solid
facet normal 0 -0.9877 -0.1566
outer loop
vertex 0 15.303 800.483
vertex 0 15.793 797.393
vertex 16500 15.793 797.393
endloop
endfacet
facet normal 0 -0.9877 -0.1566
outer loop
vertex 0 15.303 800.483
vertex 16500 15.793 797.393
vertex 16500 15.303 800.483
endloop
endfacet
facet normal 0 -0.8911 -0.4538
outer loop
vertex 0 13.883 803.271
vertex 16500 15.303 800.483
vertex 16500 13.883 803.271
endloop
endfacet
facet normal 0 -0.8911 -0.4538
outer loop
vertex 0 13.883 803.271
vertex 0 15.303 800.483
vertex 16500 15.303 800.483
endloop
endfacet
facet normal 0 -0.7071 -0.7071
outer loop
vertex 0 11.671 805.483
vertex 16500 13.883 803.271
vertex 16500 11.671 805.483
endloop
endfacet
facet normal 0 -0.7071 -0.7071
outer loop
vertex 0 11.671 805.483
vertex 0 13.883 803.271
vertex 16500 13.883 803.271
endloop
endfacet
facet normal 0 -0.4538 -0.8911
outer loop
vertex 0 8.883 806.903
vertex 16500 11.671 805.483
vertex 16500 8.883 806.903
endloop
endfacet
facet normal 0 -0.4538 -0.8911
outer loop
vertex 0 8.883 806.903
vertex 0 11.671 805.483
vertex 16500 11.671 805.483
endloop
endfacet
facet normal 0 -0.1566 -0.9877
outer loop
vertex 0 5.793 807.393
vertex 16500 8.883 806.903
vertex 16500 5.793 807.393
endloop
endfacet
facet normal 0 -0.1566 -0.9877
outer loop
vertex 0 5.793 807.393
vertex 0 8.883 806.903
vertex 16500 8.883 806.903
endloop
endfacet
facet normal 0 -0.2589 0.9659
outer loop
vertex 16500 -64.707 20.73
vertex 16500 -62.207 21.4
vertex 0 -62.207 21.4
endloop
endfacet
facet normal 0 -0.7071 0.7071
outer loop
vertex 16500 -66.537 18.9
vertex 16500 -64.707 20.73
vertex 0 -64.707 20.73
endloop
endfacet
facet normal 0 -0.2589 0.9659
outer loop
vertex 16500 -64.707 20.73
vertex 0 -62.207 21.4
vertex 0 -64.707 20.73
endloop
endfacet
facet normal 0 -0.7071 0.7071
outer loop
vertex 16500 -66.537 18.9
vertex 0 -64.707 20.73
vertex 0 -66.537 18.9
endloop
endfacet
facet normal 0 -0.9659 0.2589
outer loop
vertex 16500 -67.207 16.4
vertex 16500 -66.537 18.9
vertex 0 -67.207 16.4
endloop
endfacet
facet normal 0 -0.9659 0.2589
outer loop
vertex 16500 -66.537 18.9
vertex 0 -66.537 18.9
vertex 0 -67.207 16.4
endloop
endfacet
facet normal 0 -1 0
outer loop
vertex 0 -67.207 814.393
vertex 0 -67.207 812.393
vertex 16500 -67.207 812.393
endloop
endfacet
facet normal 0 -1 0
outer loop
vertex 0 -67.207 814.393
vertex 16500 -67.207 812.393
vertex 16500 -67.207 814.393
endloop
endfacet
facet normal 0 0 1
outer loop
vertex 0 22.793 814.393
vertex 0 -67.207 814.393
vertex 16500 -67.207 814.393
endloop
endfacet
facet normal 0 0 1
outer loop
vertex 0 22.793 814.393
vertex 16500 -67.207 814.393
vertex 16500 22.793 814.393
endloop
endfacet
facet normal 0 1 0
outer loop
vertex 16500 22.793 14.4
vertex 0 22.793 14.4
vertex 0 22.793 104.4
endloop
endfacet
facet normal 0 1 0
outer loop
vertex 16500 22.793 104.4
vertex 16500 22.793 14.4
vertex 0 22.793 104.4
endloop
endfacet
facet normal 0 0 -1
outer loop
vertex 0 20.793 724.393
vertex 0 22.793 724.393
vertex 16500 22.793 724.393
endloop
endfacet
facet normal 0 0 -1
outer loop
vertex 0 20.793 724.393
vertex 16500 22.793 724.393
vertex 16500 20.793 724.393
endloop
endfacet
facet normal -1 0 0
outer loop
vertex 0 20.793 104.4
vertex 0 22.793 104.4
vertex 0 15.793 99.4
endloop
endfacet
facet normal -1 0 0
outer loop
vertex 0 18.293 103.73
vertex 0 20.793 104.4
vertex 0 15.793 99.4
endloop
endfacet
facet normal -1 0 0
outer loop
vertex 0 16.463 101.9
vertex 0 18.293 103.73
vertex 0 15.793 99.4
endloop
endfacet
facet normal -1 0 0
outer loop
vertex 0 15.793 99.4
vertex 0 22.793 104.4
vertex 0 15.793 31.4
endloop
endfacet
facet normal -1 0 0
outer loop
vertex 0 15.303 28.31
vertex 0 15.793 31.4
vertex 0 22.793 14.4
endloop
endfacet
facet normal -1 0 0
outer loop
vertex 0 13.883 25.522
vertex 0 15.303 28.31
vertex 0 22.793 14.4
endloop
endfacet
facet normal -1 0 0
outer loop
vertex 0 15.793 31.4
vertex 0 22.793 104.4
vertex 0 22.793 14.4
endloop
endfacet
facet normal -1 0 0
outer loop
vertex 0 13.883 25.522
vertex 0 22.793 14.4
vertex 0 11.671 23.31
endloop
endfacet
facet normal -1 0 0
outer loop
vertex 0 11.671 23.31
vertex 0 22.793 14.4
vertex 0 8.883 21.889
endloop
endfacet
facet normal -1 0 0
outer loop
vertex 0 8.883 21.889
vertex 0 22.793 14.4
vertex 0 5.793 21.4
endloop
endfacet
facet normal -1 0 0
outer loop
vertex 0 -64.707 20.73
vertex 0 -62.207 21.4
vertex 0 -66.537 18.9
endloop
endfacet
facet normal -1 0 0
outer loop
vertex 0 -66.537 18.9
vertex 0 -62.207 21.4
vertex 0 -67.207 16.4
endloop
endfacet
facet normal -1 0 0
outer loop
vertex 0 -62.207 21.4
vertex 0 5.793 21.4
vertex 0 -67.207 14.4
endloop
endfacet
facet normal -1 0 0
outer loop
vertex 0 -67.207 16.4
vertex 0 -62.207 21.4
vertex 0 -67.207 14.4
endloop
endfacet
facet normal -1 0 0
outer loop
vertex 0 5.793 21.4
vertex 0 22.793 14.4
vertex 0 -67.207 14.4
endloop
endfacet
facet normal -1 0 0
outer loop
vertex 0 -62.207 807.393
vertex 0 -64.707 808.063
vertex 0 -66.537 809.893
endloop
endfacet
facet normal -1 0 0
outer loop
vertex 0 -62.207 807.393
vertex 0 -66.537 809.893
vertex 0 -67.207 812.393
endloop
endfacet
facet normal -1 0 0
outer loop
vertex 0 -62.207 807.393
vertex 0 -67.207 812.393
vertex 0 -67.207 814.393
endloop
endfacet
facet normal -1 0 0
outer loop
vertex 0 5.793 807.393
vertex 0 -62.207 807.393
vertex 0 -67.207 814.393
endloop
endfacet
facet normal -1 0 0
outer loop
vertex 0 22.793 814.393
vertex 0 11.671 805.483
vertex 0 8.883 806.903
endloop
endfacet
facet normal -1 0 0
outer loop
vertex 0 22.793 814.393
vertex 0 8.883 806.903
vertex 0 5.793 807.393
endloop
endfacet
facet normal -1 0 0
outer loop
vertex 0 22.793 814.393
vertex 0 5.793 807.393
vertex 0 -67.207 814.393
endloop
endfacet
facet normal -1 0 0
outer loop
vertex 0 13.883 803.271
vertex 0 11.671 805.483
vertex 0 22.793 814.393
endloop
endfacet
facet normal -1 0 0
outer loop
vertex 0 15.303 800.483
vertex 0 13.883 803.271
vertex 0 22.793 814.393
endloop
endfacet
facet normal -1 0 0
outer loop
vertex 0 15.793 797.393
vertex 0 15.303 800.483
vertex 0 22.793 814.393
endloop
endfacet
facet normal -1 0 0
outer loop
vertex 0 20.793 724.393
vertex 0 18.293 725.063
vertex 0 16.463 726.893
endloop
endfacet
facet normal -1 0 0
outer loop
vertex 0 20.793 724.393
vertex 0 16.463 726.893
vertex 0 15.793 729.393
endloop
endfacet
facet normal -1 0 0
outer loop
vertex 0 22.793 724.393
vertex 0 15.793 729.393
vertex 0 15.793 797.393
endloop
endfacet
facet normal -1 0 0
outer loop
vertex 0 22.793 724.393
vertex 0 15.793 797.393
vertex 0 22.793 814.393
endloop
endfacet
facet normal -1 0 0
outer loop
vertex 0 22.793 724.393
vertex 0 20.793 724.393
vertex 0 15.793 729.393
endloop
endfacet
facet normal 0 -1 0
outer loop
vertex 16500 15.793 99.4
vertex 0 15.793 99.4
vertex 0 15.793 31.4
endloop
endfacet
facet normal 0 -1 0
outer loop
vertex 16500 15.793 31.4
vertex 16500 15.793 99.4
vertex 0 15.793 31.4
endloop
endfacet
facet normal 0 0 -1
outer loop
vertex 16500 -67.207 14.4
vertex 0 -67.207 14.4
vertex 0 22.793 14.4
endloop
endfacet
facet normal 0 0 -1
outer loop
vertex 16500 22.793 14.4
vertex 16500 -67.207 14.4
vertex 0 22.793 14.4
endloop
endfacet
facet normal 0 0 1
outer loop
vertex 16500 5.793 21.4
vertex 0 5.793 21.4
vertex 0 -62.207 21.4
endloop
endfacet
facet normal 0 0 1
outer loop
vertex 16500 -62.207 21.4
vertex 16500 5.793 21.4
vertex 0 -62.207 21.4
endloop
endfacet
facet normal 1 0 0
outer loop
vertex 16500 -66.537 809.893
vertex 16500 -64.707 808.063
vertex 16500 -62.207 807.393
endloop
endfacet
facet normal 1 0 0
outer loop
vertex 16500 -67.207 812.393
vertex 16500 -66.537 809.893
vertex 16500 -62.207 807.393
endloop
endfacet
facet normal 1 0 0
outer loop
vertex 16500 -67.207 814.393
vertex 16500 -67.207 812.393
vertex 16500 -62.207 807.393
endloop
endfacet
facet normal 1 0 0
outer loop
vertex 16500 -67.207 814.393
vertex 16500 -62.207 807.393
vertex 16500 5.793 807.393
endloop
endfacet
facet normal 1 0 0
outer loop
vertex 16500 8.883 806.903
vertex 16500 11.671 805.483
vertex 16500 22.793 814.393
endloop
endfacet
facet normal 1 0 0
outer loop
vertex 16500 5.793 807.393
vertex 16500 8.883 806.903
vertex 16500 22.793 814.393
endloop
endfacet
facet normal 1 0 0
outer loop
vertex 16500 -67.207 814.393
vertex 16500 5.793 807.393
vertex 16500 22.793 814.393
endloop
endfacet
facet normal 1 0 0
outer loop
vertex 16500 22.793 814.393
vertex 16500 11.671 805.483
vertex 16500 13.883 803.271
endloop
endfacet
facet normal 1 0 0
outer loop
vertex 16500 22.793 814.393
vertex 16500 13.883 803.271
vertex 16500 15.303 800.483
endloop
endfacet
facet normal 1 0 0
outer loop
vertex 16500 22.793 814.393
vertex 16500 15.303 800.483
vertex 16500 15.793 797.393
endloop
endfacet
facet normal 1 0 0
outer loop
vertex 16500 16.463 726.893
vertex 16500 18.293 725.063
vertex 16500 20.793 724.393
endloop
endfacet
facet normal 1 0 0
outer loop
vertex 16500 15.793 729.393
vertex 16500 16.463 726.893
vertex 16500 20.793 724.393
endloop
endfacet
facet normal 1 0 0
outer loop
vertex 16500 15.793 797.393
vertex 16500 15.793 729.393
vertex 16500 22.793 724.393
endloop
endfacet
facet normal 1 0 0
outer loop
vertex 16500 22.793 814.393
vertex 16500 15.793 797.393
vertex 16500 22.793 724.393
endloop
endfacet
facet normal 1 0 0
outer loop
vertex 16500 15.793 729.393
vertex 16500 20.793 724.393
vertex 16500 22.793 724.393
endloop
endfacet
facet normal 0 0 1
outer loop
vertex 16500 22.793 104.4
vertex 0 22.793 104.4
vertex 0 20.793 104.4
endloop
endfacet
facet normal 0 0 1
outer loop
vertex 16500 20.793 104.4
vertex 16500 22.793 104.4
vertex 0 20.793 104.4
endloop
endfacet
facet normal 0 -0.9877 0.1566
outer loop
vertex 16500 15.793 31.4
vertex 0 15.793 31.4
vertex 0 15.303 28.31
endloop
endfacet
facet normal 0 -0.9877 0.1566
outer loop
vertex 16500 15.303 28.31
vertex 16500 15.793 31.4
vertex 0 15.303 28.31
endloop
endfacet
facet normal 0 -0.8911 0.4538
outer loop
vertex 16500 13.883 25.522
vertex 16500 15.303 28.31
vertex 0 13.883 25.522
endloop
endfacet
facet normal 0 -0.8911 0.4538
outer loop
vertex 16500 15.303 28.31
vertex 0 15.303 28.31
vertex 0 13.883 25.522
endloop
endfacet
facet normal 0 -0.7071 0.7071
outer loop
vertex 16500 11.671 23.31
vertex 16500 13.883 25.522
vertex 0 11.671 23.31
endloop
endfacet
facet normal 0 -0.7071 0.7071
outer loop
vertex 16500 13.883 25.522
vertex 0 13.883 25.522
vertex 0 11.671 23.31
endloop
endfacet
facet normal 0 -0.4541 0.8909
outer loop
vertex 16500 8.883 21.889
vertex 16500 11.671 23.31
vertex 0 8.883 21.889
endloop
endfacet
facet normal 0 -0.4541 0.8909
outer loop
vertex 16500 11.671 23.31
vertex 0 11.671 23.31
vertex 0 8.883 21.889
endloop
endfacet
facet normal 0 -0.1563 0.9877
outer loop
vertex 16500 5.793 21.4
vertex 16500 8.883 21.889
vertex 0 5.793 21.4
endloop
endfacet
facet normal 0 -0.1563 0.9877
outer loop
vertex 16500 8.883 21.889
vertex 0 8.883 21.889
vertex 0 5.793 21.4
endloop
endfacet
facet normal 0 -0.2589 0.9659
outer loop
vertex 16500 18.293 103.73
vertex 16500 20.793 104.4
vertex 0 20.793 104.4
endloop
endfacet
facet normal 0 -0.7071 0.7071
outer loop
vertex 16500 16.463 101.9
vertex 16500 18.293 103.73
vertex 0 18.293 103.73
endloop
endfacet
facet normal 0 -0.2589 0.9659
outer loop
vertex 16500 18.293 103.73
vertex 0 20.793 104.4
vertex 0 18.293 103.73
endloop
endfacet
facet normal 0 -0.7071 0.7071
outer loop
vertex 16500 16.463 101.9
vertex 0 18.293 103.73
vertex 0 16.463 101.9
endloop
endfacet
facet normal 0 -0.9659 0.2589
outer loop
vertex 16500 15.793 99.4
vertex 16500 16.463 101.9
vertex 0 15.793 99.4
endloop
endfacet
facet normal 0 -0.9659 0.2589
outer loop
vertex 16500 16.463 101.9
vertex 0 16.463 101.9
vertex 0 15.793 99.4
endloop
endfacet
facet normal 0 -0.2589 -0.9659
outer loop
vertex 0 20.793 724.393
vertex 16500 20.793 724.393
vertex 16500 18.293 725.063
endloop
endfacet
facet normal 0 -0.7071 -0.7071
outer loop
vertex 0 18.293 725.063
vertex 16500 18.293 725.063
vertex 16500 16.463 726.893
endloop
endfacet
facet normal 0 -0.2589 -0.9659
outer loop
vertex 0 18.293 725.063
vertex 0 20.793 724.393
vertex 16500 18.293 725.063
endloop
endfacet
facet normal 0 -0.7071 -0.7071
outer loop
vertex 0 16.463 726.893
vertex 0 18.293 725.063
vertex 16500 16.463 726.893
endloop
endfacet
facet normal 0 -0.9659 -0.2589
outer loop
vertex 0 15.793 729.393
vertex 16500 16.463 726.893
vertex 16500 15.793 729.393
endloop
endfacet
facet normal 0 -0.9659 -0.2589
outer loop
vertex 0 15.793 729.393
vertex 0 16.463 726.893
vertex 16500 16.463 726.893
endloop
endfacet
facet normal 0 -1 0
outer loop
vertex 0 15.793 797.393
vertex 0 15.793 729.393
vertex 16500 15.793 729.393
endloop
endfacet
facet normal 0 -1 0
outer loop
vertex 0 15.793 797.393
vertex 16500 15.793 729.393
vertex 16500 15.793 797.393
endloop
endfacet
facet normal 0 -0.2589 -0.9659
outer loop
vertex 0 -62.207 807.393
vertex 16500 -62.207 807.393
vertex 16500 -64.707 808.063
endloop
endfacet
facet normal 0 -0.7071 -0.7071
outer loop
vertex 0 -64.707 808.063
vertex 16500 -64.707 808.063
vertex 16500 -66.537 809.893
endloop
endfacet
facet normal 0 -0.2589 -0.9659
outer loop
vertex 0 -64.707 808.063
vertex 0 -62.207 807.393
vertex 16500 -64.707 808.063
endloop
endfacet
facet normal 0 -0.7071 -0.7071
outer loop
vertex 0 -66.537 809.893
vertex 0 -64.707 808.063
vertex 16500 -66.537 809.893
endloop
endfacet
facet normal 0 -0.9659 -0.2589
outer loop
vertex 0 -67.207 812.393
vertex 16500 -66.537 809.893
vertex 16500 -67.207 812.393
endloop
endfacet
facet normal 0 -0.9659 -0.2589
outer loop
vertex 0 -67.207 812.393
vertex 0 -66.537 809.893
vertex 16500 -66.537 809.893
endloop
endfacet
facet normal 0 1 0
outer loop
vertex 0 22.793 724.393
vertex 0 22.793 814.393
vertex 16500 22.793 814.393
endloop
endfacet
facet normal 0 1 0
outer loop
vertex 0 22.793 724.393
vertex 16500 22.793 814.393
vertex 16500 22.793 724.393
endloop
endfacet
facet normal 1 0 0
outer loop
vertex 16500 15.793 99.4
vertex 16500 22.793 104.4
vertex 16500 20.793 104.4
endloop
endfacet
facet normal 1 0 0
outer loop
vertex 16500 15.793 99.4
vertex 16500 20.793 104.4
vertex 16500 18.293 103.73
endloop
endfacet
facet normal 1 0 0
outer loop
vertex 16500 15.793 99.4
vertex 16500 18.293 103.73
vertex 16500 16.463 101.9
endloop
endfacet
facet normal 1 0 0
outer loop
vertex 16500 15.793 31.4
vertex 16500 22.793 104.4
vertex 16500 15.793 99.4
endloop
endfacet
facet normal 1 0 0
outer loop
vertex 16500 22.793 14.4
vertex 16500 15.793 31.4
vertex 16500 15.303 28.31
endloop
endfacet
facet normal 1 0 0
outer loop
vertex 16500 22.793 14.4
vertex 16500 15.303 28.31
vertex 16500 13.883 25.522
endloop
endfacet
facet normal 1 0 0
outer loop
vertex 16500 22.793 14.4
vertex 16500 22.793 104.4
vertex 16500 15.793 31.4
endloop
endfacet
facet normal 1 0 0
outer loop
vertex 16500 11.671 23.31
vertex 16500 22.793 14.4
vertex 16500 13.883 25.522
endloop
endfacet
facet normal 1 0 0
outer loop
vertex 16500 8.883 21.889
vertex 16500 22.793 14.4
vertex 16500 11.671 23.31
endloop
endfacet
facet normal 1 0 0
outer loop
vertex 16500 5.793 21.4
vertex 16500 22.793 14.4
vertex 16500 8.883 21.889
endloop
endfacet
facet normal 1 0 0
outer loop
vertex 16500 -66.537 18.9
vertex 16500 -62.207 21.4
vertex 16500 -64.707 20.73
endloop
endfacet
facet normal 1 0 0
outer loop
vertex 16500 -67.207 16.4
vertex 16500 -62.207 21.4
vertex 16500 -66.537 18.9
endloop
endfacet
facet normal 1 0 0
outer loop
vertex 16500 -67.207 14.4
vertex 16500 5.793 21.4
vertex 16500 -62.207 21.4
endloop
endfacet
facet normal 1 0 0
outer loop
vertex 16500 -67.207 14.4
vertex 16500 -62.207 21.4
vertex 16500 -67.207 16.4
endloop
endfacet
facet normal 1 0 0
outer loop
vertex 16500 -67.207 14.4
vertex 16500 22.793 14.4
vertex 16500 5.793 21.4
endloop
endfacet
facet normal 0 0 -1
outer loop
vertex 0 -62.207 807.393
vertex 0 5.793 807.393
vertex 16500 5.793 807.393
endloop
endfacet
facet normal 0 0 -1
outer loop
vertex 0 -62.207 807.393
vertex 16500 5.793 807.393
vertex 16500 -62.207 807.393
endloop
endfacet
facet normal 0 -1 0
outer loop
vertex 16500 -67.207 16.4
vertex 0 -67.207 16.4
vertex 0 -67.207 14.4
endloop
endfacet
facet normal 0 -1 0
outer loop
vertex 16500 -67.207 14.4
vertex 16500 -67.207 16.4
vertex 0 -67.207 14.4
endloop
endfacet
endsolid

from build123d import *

# Parameters (mm, degrees)
EXTRUDE017_DEPTH = 16500
EXTRUDE018_DEPTH = 16500


with BuildPart() as extrude017:
    # AngleSteel004 → Extrude017 (new body)
    with BuildSketch(Plane(origin=(0, 53.415282, 39.015282), x_dir=(0, 1, 0), z_dir=(-1, 0, 0))):
        with BuildLine():
            Line((-24.615282, 24.615282), (-24.615282, -65.384718))
            Line((-24.615282, -65.384718), (-22.615282, -65.384718))
            ThreePointArc((-22.615282, -65.384718), (-19.079748, -63.920252), (-17.615282, -60.384718))
            Line((-17.615282, -60.384718), (-17.615282, 7.615282))
            ThreePointArc((-17.615282, 7.615282), (-14.68635, 14.68635), (-7.615282, 17.615282))
            Line((-7.615282, 17.615282), (60.384718, 17.615282))
            ThreePointArc((60.384718, 17.615282), (63.920252, 19.079748), (65.384718, 22.615282))
            Line((65.384718, 22.615282), (65.384718, 24.615282))
            Line((65.384718, 24.615282), (-24.615282, 24.615282))
        make_face()
    extrude(amount=-EXTRUDE017_DEPTH)


with BuildPart() as fusion001:
    # Mirror → Extrude018 (new body)
    with BuildSketch(Plane(origin=(0, 53.415282, 789.777402), x_dir=(0, -1, 0), z_dir=(1, 0, 0))):
        with BuildLine():
            Line((24.615282, -24.615282), (24.615282, 65.384718))
            Line((24.615282, 65.384718), (22.615282, 65.384718))
            ThreePointArc((22.615282, 65.384718), (19.079748, 63.920252), (17.615282, 60.384718))
            Line((17.615282, 60.384718), (17.615282, -7.615282))
            ThreePointArc((17.615282, -7.615282), (14.68635, -14.68635), (7.615282, -17.615282))
            Line((7.615282, -17.615282), (-60.384718, -17.615282))
            ThreePointArc((-60.384718, -17.615282), (-63.920252, -19.079748), (-65.384718, -22.615282))
            Line((-65.384718, -22.615282), (-65.384718, -24.615282))
            Line((-65.384718, -24.615282), (24.615282, -24.615282))
        make_face()
    extrude(amount=EXTRUDE018_DEPTH)

    # Fusion001: union Extrude017
    add(extrude017.part)


with BuildPart() as fusion_mirrored:
    # Mirror001: instance of Fusion001
    add(fusion001.part.mirror(Plane(origin=(0, 28.796342, 514.396342), x_dir=(-1, 0, 0), z_dir=(0, -1, 0))))


with BuildPart() as fusion_mirrored_1:
    # Mirror001 placement: moved
    add(fusion_mirrored.part.moved(Location((0, -6, 0))))


solid = fusion_mirrored_1.part
